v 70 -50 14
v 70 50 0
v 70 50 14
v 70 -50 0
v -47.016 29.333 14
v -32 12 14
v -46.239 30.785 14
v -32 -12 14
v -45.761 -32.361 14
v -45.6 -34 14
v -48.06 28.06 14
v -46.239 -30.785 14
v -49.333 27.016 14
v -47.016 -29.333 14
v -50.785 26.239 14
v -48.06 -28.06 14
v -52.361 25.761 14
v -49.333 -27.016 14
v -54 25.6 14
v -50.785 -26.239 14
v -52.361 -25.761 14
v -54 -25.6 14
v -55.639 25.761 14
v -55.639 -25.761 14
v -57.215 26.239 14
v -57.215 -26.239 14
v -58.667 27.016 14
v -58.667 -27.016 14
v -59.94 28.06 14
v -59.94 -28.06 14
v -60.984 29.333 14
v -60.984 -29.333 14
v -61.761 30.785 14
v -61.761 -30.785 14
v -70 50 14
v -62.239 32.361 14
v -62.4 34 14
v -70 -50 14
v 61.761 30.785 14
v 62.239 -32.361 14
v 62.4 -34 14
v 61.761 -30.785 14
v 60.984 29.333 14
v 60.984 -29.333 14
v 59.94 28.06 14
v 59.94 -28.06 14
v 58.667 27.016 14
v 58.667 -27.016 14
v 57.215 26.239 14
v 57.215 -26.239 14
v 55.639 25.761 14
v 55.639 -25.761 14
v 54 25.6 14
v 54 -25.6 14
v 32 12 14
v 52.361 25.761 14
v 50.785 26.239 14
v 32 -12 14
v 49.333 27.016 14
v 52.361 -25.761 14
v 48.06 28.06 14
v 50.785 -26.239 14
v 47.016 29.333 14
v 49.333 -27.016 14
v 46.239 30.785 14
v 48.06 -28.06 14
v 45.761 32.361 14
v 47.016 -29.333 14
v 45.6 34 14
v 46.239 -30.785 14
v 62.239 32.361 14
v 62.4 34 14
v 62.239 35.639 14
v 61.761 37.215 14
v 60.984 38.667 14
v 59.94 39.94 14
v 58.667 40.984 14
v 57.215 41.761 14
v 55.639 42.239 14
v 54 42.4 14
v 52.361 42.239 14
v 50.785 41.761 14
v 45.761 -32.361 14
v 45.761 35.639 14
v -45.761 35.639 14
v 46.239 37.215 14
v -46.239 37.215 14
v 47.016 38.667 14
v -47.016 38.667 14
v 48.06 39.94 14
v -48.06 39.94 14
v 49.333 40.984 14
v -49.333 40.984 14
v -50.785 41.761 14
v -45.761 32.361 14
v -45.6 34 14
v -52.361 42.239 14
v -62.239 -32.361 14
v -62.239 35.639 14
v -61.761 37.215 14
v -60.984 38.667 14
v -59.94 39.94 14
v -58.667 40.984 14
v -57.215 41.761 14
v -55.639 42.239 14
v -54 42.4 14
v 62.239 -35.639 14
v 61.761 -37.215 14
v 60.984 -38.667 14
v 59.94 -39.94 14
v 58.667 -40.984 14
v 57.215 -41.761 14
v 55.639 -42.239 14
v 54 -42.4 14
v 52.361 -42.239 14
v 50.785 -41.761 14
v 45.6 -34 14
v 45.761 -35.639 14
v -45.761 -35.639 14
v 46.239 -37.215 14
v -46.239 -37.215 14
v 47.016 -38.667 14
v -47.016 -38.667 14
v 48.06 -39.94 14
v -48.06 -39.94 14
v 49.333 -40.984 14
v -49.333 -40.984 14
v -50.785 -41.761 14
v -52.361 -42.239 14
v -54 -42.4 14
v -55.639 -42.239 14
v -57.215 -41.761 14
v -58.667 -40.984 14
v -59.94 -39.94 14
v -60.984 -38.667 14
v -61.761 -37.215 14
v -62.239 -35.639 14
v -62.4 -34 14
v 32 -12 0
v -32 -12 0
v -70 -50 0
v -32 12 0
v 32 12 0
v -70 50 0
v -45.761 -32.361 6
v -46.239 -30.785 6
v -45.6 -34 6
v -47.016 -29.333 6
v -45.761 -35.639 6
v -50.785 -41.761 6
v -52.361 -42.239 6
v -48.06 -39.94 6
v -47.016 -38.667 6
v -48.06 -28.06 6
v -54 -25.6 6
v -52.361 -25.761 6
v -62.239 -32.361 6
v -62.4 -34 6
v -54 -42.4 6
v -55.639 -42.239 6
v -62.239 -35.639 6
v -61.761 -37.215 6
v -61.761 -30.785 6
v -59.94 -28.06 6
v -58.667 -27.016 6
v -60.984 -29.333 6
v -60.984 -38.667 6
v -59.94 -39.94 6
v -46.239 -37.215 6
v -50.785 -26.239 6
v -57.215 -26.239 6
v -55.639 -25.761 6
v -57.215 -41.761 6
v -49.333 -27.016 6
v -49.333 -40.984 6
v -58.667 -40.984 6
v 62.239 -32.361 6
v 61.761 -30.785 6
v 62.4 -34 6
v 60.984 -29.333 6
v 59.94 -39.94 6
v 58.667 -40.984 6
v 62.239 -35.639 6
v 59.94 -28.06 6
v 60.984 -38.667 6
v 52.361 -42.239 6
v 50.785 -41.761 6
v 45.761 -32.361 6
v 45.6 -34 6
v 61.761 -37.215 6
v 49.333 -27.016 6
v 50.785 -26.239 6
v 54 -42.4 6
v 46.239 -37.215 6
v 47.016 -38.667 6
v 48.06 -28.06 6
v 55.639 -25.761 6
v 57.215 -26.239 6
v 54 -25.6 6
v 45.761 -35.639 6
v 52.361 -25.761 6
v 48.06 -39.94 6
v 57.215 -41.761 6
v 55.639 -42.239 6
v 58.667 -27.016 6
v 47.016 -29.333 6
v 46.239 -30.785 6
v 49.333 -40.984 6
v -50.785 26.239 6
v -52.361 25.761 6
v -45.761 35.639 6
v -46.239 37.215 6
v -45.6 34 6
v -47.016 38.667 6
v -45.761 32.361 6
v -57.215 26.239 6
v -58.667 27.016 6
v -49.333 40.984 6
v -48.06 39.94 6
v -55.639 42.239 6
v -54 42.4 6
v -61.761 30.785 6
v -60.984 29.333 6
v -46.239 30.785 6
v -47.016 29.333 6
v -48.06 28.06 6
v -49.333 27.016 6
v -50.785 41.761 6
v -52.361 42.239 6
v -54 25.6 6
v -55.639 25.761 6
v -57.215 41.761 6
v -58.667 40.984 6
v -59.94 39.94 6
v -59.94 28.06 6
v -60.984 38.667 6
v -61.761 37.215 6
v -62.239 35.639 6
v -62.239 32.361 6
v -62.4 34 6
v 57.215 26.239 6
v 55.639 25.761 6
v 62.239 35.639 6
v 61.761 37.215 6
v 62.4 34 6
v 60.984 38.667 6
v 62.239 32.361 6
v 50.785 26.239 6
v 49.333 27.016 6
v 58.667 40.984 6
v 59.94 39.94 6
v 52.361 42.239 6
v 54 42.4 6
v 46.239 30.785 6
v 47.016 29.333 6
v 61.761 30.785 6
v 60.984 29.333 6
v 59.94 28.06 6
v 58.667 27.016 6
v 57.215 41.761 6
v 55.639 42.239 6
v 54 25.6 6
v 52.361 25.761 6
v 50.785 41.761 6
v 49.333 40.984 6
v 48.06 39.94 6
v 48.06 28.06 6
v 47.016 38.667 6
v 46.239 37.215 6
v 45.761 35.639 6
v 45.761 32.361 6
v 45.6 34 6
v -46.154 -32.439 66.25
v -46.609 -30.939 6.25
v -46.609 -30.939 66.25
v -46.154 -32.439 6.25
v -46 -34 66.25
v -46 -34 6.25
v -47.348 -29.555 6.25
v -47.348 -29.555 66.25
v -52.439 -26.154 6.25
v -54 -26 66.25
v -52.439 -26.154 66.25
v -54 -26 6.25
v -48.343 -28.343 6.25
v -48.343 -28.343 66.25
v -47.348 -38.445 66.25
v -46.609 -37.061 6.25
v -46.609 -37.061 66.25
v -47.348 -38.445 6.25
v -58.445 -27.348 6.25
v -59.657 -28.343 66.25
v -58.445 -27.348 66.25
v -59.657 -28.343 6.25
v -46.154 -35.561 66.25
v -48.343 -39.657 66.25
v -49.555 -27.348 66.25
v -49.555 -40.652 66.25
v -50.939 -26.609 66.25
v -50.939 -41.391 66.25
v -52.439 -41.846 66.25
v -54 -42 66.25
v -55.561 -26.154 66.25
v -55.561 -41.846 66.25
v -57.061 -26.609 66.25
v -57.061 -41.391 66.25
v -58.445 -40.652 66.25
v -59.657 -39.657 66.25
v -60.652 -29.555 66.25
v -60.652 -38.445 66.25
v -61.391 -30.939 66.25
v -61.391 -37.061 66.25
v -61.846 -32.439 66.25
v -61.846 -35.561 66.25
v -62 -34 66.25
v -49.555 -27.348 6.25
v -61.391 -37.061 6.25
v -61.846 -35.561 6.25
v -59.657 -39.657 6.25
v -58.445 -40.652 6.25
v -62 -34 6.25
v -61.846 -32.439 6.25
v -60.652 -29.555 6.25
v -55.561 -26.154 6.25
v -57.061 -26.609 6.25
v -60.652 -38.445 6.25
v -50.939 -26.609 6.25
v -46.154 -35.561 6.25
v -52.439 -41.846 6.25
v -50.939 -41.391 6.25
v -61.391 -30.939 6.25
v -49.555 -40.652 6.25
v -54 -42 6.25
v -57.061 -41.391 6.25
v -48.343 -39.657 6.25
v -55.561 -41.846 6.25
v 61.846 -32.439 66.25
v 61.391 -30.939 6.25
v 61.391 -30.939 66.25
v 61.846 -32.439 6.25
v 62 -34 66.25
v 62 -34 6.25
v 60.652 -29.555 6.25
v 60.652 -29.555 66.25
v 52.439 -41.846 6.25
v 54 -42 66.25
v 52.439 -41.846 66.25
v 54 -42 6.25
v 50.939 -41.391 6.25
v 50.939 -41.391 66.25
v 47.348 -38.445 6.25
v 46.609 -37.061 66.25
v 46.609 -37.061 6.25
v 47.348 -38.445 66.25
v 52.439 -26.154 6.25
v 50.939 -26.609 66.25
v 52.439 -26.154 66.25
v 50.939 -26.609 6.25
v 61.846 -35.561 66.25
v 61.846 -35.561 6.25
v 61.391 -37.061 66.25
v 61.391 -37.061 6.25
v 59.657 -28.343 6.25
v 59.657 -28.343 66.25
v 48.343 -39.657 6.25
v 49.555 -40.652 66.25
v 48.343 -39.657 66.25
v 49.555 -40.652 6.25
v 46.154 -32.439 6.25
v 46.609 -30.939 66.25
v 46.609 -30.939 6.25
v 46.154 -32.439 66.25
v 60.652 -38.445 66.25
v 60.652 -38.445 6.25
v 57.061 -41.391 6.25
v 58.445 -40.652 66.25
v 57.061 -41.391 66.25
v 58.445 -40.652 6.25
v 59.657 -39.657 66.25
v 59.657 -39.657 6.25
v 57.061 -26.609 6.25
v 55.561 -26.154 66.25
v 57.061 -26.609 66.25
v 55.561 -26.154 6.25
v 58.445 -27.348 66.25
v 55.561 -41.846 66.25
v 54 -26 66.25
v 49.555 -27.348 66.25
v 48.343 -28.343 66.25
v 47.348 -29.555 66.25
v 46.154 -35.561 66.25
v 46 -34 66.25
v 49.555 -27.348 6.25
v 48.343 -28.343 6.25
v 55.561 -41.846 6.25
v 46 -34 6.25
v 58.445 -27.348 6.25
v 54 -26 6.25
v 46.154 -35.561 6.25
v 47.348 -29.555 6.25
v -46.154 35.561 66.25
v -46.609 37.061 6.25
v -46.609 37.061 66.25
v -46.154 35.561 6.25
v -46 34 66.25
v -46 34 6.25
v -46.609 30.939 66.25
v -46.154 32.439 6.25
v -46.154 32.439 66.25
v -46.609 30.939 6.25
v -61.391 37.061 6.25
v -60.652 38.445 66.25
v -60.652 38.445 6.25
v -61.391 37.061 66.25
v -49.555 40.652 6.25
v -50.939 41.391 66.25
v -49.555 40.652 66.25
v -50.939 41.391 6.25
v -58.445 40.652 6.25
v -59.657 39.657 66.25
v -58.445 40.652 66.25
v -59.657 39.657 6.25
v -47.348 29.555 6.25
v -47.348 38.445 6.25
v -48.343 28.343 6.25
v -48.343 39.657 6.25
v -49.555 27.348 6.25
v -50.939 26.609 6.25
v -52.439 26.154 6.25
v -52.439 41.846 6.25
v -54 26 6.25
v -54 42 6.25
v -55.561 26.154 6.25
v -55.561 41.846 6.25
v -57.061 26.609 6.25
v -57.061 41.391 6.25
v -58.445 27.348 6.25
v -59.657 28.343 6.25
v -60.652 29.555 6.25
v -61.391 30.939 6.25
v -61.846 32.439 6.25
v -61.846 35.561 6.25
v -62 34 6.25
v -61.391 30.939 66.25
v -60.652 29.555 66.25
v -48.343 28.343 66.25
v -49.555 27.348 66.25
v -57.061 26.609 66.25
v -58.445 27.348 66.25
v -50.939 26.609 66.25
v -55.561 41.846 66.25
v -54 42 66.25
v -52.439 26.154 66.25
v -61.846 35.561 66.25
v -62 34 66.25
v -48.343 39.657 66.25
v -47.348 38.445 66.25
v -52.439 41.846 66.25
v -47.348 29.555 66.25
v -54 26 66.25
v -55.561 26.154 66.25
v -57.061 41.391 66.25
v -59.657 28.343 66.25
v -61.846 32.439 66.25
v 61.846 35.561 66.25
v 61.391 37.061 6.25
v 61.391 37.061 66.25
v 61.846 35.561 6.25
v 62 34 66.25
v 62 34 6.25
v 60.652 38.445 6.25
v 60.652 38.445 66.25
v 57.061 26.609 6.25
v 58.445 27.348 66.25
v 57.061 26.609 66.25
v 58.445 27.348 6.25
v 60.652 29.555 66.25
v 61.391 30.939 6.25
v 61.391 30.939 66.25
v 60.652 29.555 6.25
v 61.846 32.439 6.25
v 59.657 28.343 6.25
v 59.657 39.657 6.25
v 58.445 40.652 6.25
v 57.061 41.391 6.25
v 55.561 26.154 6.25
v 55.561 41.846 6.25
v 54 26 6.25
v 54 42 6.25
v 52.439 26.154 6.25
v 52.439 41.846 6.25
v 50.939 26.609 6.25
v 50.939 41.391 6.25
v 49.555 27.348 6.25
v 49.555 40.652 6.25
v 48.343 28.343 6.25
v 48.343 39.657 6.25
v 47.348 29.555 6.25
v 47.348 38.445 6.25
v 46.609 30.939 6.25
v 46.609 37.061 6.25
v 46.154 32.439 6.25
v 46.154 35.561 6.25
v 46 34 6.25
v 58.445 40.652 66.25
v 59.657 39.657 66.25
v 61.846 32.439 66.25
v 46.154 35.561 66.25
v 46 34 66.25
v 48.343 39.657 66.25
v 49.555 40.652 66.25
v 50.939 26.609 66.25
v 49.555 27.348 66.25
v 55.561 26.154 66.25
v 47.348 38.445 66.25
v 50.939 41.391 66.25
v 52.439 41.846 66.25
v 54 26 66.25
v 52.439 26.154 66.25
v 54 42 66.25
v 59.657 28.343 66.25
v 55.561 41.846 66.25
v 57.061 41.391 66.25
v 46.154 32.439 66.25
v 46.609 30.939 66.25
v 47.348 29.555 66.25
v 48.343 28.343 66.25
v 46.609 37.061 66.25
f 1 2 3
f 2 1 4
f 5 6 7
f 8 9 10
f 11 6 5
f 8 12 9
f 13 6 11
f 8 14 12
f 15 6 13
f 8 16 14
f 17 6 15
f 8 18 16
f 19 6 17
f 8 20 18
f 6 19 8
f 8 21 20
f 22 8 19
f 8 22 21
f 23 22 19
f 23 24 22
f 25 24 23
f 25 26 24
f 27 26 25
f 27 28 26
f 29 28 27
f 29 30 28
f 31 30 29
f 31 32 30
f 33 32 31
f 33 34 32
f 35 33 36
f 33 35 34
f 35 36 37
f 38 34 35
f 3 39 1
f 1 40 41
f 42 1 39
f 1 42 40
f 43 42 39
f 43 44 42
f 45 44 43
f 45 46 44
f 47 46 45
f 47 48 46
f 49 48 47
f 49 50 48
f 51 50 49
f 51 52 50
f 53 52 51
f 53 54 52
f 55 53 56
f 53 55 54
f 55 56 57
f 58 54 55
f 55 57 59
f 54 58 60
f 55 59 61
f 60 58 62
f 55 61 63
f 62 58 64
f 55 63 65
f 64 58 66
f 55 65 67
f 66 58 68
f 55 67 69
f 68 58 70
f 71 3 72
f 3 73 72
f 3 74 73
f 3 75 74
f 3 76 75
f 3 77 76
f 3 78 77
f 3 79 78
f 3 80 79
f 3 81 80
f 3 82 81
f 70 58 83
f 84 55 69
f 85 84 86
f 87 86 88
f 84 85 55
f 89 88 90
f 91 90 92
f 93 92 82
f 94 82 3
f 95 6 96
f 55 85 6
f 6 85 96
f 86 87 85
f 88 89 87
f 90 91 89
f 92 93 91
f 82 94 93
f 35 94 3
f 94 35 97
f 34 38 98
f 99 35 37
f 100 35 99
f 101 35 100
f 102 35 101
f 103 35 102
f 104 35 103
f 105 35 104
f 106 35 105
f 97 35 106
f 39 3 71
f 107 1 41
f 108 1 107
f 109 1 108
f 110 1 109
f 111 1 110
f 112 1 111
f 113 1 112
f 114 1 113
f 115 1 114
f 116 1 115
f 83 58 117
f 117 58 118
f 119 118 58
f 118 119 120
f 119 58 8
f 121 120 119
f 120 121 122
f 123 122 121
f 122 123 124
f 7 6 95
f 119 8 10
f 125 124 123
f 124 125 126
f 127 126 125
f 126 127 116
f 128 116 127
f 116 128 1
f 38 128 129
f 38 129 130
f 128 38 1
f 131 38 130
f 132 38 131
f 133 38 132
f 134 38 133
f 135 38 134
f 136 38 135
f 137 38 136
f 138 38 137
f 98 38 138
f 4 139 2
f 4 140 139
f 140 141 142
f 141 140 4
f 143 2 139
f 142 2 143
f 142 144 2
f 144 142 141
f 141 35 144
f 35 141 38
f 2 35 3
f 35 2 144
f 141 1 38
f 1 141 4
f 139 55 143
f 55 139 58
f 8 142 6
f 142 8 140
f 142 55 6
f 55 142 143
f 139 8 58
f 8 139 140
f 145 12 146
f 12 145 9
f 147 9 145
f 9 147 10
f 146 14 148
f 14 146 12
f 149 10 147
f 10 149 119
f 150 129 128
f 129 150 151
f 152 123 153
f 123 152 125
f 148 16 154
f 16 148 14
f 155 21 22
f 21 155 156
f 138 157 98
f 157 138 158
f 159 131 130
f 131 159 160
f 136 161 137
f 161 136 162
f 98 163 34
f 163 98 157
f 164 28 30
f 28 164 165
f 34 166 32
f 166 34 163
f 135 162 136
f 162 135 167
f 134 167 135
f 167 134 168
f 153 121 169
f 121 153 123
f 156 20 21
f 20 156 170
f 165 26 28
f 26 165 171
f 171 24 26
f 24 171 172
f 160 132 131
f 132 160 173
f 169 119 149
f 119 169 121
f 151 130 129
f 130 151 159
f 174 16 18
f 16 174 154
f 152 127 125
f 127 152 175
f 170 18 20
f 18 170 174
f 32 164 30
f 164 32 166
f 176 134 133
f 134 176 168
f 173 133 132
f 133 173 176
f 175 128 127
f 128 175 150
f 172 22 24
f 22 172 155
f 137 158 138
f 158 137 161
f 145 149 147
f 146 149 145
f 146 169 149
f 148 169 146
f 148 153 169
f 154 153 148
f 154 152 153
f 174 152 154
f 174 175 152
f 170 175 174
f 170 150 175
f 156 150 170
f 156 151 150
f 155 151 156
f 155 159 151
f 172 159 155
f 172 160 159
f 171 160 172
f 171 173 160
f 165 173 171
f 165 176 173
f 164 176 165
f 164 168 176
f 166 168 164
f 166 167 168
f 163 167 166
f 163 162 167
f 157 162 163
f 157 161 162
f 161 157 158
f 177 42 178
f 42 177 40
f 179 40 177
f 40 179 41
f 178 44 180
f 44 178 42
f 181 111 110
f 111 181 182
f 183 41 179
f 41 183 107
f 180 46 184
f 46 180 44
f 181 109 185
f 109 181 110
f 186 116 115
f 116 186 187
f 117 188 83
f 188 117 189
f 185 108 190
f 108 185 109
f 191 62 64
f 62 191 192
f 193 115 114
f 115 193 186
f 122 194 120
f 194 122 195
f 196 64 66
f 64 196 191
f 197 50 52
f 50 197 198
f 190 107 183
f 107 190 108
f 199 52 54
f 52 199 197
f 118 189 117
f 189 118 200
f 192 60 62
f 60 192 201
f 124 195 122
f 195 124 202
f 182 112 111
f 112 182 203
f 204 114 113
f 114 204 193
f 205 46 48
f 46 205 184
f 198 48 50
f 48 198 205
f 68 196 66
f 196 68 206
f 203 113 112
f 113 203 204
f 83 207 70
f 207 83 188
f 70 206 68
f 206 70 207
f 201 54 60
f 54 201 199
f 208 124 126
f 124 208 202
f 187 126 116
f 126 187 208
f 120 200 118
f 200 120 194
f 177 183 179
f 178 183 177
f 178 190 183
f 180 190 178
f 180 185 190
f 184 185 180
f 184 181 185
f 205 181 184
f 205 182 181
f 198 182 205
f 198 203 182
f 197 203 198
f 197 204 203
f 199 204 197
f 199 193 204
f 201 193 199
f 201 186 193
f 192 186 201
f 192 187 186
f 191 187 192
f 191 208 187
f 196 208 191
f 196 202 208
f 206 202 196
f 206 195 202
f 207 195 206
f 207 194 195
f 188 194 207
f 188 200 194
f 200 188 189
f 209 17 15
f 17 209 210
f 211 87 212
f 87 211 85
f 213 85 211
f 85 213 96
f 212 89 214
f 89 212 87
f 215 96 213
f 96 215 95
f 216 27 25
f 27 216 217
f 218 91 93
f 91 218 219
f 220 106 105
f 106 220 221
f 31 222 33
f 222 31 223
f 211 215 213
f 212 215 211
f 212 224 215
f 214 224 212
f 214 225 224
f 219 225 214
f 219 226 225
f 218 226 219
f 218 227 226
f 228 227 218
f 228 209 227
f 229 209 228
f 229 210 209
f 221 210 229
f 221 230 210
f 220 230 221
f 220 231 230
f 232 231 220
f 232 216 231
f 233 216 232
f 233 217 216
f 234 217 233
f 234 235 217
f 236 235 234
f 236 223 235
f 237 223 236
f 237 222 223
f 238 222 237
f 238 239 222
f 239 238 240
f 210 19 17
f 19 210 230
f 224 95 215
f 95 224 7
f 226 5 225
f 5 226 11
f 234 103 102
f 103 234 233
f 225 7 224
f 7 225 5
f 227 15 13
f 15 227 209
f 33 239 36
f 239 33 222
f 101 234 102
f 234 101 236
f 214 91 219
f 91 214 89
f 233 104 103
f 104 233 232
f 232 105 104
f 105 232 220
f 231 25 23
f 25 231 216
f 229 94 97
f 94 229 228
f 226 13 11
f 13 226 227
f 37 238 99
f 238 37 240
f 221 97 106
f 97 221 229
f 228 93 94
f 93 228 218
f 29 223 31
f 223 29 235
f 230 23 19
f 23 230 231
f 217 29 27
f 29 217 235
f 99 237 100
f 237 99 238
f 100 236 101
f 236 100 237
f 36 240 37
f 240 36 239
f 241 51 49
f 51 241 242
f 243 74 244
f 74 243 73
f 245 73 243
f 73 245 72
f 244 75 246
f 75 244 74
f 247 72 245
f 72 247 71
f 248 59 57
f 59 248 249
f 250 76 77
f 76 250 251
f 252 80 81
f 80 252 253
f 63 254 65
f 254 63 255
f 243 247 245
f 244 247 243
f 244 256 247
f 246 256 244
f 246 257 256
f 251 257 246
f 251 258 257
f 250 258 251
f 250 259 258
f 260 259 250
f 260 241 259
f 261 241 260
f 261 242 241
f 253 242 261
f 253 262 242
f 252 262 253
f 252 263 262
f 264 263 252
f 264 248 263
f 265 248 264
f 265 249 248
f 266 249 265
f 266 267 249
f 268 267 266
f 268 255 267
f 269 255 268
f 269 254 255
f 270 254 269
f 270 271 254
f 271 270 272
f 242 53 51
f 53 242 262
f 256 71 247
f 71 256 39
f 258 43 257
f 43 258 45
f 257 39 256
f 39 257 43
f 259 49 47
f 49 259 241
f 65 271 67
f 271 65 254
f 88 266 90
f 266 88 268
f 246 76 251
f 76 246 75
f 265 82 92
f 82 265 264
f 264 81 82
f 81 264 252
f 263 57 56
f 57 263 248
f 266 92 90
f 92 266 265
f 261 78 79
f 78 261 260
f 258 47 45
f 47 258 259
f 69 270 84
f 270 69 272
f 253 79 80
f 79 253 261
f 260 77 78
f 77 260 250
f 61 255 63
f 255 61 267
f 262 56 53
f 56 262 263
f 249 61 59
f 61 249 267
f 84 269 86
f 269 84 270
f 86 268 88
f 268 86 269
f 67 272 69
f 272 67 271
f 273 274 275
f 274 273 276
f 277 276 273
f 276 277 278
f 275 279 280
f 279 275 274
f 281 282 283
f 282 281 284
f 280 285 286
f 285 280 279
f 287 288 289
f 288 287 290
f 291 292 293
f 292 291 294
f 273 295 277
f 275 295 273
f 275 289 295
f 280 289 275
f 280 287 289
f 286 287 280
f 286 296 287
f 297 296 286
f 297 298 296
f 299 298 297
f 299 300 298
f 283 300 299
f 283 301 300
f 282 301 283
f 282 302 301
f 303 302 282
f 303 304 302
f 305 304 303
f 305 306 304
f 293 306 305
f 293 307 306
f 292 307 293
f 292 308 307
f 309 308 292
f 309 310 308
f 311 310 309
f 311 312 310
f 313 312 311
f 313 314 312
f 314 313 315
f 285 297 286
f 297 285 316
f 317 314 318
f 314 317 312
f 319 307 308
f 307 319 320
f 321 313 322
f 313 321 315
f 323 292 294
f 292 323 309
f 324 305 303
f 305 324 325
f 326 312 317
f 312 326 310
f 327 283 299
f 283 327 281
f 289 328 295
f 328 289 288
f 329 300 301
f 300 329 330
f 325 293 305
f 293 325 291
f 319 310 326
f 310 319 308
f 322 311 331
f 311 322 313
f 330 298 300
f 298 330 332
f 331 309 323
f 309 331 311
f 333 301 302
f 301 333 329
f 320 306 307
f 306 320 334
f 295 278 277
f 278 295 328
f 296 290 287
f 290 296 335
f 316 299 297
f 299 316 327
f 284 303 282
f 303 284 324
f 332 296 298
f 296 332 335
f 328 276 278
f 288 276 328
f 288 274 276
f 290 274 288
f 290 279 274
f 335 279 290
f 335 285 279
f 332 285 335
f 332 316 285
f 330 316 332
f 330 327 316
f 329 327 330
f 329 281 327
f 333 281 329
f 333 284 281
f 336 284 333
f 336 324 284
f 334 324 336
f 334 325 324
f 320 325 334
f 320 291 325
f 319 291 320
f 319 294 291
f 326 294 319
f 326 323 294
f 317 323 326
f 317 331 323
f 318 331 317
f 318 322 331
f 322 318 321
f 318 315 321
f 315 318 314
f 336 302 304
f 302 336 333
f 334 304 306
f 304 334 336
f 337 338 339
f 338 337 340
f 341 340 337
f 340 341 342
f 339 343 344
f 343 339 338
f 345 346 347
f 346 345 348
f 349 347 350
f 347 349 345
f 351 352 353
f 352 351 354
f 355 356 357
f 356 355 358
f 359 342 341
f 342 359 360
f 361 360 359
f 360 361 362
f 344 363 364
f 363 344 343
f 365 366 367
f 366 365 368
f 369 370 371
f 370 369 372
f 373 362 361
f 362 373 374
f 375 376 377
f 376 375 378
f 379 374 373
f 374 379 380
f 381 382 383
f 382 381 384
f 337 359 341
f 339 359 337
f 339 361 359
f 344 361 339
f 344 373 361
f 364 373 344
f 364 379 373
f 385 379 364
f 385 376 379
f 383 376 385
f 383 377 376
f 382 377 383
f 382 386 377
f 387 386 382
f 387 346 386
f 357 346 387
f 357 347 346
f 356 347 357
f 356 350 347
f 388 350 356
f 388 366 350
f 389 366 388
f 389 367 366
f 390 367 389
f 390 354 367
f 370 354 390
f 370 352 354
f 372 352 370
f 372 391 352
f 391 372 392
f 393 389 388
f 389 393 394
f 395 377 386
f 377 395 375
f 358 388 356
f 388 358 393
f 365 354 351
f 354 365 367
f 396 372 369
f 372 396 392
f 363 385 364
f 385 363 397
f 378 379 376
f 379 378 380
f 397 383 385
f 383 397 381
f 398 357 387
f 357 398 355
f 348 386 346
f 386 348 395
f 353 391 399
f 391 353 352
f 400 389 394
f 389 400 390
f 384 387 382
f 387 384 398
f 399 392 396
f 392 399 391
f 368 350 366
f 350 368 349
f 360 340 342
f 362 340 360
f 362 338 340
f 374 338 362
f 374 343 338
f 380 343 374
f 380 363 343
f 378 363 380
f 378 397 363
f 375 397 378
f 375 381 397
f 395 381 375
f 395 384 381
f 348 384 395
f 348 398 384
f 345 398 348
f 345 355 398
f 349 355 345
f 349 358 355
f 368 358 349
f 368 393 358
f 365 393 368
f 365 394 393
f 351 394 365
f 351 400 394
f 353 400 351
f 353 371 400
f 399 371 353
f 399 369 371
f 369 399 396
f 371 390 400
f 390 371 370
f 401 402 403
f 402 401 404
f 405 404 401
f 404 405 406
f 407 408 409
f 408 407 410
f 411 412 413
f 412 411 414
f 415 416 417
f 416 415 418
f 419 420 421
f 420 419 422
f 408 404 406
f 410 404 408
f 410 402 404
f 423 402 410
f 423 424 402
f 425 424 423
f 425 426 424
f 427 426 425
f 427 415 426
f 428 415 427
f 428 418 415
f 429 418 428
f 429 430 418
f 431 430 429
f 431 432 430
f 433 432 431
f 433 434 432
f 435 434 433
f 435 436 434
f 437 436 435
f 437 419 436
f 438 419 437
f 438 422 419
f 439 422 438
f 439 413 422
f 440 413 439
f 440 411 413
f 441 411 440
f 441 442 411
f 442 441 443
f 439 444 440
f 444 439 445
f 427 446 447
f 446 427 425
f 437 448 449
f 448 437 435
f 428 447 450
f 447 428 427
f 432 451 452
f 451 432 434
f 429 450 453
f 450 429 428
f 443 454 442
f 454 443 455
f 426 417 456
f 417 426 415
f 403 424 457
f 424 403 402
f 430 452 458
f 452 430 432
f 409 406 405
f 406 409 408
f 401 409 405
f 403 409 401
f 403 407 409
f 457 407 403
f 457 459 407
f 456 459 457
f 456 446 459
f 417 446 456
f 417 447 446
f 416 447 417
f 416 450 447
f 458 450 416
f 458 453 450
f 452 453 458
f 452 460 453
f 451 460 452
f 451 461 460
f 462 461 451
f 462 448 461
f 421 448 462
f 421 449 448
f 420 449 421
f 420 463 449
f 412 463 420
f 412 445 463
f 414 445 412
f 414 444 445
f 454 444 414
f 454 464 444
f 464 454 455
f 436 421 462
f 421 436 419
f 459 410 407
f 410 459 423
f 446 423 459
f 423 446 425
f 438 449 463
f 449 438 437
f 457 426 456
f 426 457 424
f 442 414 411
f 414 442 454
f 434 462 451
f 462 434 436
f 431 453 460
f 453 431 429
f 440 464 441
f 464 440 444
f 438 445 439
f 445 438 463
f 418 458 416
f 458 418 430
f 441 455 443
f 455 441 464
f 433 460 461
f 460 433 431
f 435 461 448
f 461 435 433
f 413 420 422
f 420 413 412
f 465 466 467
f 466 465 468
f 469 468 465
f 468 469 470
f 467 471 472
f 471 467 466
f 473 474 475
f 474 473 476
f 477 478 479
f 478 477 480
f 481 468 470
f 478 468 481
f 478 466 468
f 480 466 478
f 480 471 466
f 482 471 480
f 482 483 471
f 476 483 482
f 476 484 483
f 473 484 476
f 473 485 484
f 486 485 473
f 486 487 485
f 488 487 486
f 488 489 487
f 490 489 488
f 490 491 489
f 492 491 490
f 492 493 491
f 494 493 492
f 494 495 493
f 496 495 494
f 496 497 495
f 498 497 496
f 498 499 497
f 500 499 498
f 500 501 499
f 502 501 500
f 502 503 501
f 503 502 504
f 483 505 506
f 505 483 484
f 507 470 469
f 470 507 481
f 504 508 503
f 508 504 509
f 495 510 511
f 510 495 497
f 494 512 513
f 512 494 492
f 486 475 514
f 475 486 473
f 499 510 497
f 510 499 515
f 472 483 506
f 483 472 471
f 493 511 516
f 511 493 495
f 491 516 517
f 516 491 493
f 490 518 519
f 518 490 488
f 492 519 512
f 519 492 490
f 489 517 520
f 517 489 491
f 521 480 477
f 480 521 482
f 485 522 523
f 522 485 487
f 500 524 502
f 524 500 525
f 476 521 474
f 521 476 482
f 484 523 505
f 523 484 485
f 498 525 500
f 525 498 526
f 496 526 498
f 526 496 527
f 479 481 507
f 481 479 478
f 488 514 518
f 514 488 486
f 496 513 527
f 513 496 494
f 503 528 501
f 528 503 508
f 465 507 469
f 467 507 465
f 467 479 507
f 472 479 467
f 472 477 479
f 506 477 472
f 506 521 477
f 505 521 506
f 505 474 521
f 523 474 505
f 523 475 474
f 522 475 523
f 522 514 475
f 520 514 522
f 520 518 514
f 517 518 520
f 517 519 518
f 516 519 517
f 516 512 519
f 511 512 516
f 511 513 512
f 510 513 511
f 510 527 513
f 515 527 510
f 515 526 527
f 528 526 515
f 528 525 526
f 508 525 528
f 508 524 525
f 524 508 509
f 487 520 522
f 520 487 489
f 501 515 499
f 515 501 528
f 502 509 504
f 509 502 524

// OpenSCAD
$fn = 32;

// ------------------------------------------------------------------------
// Frame with four posts: 140 x 100 mm frame, four d16 posts
// Every part is its own module, assembly() places them once.
// ------------------------------------------------------------------------

// --- part 1 ---
module base_frame() {
  difference() {
    translate([-70, -50, 0]) cube([140, 100, 14]);
    translate([-32, -12, -1]) cube([64, 24, 16]);
    translate([-54, -34, 6]) cylinder(h = 9, d = 16.8);
    translate([54, -34, 6]) cylinder(h = 9, d = 16.8);
    translate([-54, 34, 6]) cylinder(h = 9, d = 16.8);
    translate([54, 34, 6]) cylinder(h = 9, d = 16.8);
  }
}

// --- part 2 ---
module post1() {
  cylinder(h = 60, d = 16);
}

// --- part 3 ---
module post2() {
  cylinder(h = 60, d = 16);
}

// --- part 4 ---
module post3() {
  cylinder(h = 60, d = 16);
}

// --- part 5 ---
module post4() {
  cylinder(h = 60, d = 16);
}

// --- assembly ---
module assembly() {
  translate([0, 0, 0]) rotate([0, 0, 0]) base_frame();
  translate([-54, -34, 6.25]) rotate([0, 0, 0]) post1();
  translate([54, -34, 6.25]) rotate([0, 0, 0]) post2();
  translate([-54, 34, 6.25]) rotate([0, 0, 0]) post3();
  translate([54, 34, 6.25]) rotate([0, 0, 0]) post4();
}

assembly();
